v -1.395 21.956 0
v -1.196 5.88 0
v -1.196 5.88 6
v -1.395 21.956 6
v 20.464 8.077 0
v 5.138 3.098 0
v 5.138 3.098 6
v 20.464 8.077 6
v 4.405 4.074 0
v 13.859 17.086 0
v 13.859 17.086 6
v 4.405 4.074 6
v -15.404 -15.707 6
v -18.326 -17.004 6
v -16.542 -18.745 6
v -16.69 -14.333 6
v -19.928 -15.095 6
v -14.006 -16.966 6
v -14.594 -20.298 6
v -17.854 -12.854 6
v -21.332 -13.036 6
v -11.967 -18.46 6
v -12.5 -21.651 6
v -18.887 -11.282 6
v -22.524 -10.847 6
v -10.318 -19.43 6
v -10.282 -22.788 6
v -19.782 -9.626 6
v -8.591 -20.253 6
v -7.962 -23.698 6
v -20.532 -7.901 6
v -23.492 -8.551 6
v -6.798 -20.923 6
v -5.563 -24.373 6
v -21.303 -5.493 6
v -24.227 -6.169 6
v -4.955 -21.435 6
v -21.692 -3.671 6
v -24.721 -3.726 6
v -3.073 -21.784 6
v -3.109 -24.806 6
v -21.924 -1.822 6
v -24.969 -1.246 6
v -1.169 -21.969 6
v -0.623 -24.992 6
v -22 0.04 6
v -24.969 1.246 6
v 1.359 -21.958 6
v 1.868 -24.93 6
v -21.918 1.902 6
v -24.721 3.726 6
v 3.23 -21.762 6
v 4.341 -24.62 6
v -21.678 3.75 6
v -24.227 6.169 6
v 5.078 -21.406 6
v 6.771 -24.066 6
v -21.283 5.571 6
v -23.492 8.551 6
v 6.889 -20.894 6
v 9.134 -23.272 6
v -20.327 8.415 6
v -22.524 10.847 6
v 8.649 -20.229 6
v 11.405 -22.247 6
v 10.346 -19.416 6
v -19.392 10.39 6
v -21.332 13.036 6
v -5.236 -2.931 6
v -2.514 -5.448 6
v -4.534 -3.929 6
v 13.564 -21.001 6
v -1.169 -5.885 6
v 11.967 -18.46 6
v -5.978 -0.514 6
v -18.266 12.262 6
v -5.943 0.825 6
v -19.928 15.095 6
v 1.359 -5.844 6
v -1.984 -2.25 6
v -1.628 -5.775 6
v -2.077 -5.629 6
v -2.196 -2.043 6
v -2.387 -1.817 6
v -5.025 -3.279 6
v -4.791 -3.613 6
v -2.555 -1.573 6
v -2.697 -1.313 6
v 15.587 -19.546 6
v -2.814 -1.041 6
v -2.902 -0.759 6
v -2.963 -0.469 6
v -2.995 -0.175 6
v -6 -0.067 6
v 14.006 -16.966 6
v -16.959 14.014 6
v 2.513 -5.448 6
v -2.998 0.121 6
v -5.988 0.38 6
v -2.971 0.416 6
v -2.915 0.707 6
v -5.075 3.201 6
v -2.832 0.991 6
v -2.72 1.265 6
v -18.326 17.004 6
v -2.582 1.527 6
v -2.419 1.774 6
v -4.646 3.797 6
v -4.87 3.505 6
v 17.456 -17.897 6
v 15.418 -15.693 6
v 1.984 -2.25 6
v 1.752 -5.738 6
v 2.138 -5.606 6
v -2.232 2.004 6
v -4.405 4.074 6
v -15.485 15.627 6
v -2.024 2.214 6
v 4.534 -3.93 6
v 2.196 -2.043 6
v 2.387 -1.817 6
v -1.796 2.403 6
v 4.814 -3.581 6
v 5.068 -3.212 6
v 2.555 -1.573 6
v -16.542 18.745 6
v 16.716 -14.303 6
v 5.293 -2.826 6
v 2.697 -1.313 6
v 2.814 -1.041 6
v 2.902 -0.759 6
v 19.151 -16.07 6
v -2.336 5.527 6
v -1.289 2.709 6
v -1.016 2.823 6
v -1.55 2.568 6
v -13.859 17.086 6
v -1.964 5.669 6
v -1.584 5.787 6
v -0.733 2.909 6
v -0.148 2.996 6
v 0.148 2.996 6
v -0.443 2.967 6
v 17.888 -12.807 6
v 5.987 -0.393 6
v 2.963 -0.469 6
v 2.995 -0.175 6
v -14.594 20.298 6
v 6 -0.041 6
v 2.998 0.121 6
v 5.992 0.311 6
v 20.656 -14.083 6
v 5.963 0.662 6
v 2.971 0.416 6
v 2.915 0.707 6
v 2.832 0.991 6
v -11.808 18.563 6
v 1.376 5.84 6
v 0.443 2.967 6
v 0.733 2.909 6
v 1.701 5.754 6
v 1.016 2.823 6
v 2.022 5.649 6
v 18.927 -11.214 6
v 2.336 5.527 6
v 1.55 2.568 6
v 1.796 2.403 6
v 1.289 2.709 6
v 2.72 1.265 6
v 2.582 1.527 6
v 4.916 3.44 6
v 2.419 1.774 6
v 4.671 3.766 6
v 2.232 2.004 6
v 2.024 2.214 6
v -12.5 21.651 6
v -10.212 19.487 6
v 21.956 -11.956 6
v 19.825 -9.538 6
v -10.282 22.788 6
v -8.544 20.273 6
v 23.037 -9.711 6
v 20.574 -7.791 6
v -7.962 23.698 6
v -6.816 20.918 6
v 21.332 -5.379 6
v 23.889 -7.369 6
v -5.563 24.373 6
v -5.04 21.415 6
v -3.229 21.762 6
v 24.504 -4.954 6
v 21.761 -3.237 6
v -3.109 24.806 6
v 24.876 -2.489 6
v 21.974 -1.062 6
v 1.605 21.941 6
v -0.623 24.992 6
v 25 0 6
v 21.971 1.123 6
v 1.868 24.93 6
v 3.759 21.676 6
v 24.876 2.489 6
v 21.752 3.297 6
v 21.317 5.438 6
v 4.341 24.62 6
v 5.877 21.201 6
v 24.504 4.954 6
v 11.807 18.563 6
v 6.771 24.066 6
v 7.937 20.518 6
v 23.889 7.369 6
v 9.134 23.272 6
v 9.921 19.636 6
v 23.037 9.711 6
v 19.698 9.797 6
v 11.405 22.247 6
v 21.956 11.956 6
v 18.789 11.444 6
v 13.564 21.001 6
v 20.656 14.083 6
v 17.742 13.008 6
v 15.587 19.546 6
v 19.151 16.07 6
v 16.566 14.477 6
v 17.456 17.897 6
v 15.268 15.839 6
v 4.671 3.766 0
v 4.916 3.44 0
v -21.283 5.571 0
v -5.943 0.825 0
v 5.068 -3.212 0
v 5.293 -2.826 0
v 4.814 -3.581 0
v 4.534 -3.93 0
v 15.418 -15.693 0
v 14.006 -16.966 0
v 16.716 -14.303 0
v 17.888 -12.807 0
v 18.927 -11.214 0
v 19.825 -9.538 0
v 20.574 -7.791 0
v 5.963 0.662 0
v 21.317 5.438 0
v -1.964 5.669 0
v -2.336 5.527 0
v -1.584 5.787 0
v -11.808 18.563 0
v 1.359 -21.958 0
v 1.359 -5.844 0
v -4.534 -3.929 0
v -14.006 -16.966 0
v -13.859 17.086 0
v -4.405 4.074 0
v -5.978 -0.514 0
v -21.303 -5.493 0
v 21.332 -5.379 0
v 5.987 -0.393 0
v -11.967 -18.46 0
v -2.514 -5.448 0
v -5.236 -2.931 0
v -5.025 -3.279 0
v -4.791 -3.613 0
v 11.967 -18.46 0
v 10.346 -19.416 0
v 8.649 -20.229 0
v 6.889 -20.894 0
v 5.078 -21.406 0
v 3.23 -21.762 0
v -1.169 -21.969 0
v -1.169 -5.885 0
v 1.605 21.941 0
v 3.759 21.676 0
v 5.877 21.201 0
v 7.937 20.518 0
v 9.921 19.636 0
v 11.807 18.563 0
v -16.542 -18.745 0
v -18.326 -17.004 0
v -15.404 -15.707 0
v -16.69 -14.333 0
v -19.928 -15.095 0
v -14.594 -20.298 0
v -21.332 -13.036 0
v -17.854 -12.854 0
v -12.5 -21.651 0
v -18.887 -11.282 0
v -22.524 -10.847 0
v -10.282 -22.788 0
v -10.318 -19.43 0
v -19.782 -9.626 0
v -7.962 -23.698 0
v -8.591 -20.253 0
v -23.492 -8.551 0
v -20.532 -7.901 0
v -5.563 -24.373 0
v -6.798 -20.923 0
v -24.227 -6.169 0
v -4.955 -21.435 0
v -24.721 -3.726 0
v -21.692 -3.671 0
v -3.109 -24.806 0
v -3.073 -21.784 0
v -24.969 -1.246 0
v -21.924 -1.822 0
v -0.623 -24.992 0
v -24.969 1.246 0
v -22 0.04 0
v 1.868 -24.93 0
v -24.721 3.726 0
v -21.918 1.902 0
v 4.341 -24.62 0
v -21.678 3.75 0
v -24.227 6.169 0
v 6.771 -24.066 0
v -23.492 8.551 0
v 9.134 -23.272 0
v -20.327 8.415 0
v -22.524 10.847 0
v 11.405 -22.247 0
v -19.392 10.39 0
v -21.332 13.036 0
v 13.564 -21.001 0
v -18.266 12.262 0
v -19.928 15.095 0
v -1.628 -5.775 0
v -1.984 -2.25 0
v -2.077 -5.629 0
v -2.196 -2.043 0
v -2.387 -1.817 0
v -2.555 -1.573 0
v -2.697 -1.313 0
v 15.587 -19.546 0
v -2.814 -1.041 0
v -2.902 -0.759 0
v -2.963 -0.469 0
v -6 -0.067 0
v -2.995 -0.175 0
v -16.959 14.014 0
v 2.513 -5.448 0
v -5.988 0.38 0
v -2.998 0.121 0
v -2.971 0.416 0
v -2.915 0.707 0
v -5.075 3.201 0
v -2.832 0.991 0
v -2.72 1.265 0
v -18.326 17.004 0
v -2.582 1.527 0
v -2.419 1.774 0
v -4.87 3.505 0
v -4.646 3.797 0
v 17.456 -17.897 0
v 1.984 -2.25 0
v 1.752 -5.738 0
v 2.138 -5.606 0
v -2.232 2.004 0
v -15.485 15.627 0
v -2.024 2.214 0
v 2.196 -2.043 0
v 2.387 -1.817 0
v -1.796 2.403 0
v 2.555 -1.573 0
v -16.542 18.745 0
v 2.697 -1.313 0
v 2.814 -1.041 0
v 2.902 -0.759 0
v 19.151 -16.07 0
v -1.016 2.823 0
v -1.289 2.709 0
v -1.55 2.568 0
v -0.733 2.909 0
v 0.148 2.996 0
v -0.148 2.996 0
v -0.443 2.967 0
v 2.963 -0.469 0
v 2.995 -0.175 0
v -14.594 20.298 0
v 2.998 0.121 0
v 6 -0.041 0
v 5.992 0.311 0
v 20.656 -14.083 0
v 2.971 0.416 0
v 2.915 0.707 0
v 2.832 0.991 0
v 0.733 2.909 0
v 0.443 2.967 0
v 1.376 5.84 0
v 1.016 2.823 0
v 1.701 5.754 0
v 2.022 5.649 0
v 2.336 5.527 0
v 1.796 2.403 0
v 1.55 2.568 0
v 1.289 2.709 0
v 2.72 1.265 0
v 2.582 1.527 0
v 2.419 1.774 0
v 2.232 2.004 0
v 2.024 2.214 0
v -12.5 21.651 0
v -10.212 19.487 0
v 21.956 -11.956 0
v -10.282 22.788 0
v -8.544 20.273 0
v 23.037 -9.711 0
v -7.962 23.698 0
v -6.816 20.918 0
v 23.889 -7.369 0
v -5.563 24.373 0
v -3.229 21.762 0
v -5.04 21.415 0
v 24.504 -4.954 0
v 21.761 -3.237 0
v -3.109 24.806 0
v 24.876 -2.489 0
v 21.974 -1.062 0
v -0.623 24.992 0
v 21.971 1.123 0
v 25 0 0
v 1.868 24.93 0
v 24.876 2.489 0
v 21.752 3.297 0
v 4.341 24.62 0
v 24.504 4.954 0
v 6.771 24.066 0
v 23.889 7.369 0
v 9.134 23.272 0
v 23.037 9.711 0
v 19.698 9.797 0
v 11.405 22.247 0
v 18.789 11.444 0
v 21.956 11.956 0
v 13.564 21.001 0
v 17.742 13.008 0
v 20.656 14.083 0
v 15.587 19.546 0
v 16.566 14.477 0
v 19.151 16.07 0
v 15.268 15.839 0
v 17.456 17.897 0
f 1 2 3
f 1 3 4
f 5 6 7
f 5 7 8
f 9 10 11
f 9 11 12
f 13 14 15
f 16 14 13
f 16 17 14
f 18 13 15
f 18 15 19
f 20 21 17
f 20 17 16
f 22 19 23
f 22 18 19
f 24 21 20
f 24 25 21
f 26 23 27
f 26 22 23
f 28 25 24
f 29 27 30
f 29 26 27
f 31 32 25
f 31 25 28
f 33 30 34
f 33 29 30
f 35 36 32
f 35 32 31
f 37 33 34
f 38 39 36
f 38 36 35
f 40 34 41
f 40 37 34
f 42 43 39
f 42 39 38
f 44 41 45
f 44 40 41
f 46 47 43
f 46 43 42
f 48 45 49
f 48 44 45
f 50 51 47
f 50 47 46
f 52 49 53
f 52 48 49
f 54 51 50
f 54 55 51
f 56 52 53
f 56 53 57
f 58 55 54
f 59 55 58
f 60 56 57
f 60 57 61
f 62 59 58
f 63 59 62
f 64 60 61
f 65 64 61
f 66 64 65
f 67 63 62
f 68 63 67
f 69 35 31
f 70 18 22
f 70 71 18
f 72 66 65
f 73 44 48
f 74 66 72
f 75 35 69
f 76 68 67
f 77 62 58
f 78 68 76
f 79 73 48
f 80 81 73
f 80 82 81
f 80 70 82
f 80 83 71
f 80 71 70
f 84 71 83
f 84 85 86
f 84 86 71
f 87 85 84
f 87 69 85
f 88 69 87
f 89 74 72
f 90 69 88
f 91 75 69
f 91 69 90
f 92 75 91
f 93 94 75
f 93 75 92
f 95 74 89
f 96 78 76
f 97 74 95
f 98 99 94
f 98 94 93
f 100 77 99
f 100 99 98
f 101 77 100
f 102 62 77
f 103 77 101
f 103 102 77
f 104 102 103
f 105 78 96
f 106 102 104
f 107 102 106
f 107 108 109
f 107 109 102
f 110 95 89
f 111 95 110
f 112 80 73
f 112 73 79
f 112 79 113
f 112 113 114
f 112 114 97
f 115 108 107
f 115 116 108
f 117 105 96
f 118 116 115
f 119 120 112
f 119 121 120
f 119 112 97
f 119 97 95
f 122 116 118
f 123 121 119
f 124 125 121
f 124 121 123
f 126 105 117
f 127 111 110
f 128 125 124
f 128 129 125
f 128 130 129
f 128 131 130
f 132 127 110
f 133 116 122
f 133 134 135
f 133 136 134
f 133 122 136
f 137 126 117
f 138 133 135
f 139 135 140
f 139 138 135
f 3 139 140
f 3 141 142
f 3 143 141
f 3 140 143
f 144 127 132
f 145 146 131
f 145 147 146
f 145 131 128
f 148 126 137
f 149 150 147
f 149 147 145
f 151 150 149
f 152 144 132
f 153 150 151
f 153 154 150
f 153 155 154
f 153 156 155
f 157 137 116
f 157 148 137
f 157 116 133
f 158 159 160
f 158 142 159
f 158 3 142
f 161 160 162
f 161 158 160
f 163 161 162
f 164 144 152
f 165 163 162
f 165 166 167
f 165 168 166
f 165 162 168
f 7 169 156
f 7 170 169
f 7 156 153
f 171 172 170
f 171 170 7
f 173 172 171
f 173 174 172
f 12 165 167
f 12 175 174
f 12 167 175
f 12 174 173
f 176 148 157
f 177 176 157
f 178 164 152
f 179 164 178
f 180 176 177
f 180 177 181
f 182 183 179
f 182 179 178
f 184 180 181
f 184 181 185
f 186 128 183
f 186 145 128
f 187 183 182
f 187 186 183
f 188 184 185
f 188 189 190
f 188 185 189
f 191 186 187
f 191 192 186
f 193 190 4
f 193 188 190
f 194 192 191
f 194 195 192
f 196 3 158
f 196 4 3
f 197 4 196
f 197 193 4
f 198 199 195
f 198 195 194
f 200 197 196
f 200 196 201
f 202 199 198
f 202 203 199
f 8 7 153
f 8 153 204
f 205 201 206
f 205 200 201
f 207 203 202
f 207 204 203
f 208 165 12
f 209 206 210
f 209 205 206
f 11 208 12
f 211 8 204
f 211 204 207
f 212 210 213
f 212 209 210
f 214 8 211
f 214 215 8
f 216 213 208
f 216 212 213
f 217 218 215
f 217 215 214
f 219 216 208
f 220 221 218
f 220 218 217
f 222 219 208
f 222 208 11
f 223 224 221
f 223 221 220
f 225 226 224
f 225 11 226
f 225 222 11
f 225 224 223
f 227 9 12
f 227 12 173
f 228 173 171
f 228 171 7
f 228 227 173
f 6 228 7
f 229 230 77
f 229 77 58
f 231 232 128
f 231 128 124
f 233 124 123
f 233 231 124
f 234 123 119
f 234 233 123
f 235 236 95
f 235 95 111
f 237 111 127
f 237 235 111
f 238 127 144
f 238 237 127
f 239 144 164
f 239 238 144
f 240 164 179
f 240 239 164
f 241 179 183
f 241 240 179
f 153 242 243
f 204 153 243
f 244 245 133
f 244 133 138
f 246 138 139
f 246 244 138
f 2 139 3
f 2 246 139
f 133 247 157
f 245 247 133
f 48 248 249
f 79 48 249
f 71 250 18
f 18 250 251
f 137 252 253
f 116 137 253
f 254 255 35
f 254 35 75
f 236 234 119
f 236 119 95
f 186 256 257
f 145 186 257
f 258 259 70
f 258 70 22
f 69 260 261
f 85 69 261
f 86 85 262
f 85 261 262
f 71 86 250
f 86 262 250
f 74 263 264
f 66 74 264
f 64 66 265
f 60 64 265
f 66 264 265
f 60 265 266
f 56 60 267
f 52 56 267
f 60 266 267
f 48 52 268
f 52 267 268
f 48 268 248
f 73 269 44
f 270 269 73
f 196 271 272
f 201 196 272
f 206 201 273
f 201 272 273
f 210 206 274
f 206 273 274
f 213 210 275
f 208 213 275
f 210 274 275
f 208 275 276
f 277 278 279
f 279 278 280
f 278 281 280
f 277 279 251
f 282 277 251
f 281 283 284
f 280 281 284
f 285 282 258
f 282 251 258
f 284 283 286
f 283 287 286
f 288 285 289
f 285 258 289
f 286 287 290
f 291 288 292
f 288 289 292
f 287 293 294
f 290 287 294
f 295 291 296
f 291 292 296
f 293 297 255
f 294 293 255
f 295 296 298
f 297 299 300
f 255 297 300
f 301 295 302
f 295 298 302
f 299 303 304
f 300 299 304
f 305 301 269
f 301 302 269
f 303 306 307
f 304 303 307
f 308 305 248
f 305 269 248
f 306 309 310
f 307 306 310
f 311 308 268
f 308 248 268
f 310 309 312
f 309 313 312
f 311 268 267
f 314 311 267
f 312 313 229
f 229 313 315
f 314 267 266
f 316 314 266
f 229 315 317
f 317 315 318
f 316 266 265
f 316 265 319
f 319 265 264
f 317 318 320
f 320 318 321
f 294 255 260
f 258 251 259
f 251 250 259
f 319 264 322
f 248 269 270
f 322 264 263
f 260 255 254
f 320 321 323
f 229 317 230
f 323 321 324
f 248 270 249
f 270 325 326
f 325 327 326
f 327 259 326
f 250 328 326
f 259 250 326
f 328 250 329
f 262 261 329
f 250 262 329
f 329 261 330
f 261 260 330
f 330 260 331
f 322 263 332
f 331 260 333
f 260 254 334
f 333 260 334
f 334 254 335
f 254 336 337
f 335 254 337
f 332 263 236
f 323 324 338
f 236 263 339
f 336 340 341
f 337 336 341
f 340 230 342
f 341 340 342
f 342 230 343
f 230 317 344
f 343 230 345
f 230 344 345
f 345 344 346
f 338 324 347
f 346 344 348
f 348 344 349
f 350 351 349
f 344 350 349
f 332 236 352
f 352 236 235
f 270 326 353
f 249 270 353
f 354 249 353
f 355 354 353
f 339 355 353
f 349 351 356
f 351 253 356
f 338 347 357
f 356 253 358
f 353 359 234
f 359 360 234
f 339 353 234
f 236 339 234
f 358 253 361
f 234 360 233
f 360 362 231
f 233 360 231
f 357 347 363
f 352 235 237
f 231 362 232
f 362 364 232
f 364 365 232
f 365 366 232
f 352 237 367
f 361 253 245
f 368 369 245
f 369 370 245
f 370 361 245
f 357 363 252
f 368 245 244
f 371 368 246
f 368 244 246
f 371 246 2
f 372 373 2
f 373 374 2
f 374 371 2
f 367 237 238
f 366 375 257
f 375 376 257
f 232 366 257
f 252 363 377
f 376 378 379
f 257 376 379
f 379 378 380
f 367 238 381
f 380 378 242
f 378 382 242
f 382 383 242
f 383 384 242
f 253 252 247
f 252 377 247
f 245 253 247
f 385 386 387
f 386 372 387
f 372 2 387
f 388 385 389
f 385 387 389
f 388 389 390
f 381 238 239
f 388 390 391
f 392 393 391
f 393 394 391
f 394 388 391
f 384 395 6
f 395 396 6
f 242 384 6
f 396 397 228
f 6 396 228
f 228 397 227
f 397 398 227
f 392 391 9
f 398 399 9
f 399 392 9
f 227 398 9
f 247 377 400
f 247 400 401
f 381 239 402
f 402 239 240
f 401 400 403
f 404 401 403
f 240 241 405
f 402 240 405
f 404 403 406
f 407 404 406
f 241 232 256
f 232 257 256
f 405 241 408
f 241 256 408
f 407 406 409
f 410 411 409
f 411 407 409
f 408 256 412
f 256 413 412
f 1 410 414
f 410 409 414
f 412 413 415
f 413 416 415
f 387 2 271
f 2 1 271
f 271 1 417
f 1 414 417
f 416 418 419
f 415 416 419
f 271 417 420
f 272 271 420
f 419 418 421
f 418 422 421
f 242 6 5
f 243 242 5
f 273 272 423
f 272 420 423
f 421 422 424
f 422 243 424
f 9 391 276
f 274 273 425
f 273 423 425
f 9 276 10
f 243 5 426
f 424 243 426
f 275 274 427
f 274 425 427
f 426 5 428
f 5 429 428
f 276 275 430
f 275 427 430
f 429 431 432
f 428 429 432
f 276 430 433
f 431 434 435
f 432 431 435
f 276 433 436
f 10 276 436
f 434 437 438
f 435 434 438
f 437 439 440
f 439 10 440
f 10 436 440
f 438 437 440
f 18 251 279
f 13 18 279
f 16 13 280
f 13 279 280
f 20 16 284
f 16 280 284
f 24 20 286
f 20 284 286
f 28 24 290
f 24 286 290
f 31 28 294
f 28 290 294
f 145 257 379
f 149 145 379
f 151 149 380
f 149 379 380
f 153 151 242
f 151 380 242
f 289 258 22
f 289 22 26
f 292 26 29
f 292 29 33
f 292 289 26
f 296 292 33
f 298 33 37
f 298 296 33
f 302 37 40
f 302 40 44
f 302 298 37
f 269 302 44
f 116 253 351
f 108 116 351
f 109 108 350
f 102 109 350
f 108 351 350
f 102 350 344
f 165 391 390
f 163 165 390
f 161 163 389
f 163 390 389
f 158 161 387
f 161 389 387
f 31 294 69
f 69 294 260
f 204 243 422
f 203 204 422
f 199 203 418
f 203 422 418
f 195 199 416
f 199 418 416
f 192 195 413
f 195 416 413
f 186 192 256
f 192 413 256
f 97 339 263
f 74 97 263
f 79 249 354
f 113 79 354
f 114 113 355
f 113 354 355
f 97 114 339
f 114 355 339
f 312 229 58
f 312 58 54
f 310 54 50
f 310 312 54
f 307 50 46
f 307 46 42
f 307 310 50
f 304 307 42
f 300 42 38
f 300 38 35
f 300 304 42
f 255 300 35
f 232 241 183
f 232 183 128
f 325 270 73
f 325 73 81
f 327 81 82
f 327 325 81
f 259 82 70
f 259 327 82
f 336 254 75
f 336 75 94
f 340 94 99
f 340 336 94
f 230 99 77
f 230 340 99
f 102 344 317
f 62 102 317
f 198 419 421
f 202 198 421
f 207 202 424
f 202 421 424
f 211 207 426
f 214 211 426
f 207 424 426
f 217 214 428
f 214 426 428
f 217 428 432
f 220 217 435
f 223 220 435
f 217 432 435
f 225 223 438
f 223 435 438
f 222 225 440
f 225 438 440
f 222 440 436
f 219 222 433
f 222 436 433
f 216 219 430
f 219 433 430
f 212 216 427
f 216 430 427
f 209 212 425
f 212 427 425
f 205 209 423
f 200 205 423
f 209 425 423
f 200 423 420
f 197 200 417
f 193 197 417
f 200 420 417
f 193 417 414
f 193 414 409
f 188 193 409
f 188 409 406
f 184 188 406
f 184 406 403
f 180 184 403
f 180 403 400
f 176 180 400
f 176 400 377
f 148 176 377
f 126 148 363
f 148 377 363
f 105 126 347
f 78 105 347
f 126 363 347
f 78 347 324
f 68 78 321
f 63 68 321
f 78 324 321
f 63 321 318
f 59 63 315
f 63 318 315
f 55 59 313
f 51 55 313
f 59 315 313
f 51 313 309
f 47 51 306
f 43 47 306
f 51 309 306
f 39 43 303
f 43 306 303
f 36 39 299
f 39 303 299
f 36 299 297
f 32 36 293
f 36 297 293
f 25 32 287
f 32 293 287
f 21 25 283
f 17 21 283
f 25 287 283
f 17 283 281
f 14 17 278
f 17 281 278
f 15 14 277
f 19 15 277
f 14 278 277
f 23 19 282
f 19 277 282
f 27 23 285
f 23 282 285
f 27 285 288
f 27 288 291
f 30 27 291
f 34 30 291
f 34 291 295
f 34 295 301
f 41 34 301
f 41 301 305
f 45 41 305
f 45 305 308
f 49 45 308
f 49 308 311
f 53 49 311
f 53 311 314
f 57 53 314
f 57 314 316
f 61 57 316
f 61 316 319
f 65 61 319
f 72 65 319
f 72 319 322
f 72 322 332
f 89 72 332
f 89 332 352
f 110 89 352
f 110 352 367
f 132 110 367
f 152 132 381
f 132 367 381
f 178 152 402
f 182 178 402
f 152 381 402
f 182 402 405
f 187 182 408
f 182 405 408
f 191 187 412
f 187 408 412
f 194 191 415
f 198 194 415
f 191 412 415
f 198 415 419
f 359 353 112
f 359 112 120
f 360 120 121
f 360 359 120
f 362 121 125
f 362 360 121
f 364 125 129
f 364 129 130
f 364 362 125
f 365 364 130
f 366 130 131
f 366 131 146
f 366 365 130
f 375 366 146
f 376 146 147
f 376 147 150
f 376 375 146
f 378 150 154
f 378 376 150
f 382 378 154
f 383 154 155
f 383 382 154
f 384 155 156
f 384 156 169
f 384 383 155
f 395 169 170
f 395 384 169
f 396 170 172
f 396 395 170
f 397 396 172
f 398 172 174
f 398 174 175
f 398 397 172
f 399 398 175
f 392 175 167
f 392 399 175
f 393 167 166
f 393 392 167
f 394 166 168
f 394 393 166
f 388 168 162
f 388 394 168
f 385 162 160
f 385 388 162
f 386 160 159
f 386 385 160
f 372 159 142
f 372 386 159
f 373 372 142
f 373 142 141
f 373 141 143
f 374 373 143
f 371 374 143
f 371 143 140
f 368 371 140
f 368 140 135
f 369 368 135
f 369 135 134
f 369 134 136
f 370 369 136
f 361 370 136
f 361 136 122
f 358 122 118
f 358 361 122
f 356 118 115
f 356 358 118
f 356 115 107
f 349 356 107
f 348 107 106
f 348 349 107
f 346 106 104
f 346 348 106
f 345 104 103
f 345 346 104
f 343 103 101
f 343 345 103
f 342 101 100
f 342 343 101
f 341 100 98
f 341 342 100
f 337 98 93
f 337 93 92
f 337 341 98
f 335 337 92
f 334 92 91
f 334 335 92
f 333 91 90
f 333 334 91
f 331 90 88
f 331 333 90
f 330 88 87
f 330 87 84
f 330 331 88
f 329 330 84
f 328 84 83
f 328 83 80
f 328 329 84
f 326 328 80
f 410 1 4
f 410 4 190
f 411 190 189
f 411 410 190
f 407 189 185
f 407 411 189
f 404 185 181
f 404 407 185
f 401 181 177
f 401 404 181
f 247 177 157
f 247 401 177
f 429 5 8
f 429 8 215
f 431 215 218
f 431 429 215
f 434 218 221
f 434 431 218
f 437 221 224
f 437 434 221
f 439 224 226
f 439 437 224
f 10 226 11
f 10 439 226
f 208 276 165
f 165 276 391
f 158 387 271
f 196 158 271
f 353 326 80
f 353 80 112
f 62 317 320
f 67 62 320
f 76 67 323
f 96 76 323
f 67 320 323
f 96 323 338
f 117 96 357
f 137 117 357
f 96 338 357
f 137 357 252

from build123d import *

# Parameters (mm, degrees)
SKETCH1_R           = 25
BOSS_EXTRUDE2_DEPTH = 6


with BuildPart() as part:
    # Sketch1 → Boss-Extrude2 (new body)
    with BuildSketch(Plane.XY):
        Circle(SKETCH1_R)
        with BuildLine():
            Line((-4.534391195, -3.929287021), (-14.005896945, -16.965696295))
            ThreePointArc((-14.005896945, -16.965696295), (-17.85403181, -12.854320212), (-20.532375114, -7.900732383))
            Line((-20.532375114, -7.900732383), (-5.235649328, -2.930524888))
            ThreePointArc((-5.235649328, -2.930524888), (-4.91047904, -3.447781257), (-4.534391195, -3.929287021))
        make_face(mode=Mode.SUBTRACT)
        with BuildLine():
            Line((-2.513596268, -5.448103688), (-11.967457053, -18.460226751))
            ThreePointArc((-11.967457053, -18.460226751), (-6.798373876, -20.923243358), (-1.168772903, -21.968931924))
            Line((-1.168772903, -21.968931924), (-1.168772903, -5.885063288))
            ThreePointArc((-1.168772903, -5.885063288), (-1.854101966, -5.706339098), (-2.513596268, -5.448103688))
        make_face(mode=Mode.SUBTRACT)
        with BuildLine():
            Line((-1.984313483, -2.25), (1.984313483, -2.25))
            ThreePointArc((1.984313483, -2.25), (0, 3), (-1.984313483, -2.25))
        make_face(mode=Mode.SUBTRACT)
        with BuildLine():
            Line((2.513209972, -5.448281898), (11.967106425, -18.460454052))
            ThreePointArc((11.967106425, -18.460454052), (6.888635303, -20.893700095), (1.358822573, -21.957996293))
            Line((1.358822573, -21.957996293), (1.358822573, -5.844108248))
            ThreePointArc((1.358822573, -5.844108248), (1.946106018, -5.675620791), (2.513209972, -5.448281898))
        make_face(mode=Mode.SUBTRACT)
        with BuildLine():
            Line((-21.303090338, -5.493481779), (-5.977939812, -0.514038525))
            ThreePointArc((-5.977939812, -0.514038525), (-5.997955792, 0.156608815), (-5.942969251, 0.825297812))
            Line((-5.942969251, 0.825297812), (-21.282827475, 5.571467909))
            ThreePointArc((-21.282827475, 5.571467909), (-21.999963111, 0.040287778), (-21.303090338, -5.493481779))
        make_face(mode=Mode.SUBTRACT)
        with BuildLine():
            Line((4.534110635, -3.929610763), (14.005574543, -16.965962446))
            ThreePointArc((14.005574543, -16.965962446), (17.888250951, -12.806657562), (20.574373634, -7.790709183))
            Line((20.574373634, -7.790709183), (5.293061004, -2.825509725))
            ThreePointArc((5.293061004, -2.825509725), (4.944500519, -3.398810765), (4.534110635, -3.929610763))
        make_face(mode=Mode.SUBTRACT)
        with BuildLine():
            Line((-11.80762859, 18.562863655), (-2.336164682, 5.526511972))
            ThreePointArc((-2.336164682, 5.526511972), (-1.774817269, 5.731494017), (-1.195863246, 5.879618278))
            Line((-1.195863246, 5.879618278), (-1.395173787, 21.95571657))
            ThreePointArc((-1.395173787, 21.95571657), (-6.815890285, 20.917543824), (-11.80762859, 18.562863655))
        make_face(mode=Mode.SUBTRACT)
        with BuildLine():
            Line((-13.858895862, 17.085988572), (-4.404999409, 4.073816417))
            ThreePointArc((-4.404999409, 4.073816417), (-4.759982517, 3.652747793), (-5.074861212, 3.200903573))
            Line((-5.074861212, 3.200903573), (-20.326913466, 8.415259293))
            ThreePointArc((-20.326913466, 8.415259293), (-17.634136679, 13.154361391), (-13.858895862, 17.085988572))
        make_face(mode=Mode.SUBTRACT)
        with BuildLine():
            Line((13.858571335, 17.0862518), (4.40471055, 4.074128737))
            ThreePointArc((4.40471055, 4.074128737), (4.796457199, 3.604718899), (5.138399164, 3.097878958))
            Line((5.138399164, 3.097878958), (20.46354969, 8.077322211))
            ThreePointArc((20.46354969, 8.077322211), (17.742384309, 13.007989815), (13.858571335, 17.0862518))
        make_face(mode=Mode.SUBTRACT)
        with BuildLine():
            Line((11.807275837, 18.563088032), (2.335770087, 5.526678758))
            ThreePointArc((2.335770087, 5.526678758), (1.862276825, 5.703676448), (1.375565326, 5.840190068))
            Line((1.375565326, 5.840190068), (1.604826213, 21.94138858))
            ThreePointArc((1.604826213, 21.94138858), (6.915515093, 20.884818673), (11.807275837, 18.563088032))
        make_face(mode=Mode.SUBTRACT)
        with BuildLine():
            Line((21.332214938, -5.379275588), (5.987092878, -0.39334319))
            ThreePointArc((5.987092878, -0.39334319), (5.998482577, 0.134932498), (5.963349889, 0.662161691))
            Line((5.963349889, 0.662161691), (21.31722763, 5.438364293))
            ThreePointArc((21.31722763, 5.438364293), (21.999978886, 0.030479888), (21.332214938, -5.379275588))
        make_face(mode=Mode.SUBTRACT)
    extrude(amount=BOSS_EXTRUDE2_DEPTH)


solid = part.part
